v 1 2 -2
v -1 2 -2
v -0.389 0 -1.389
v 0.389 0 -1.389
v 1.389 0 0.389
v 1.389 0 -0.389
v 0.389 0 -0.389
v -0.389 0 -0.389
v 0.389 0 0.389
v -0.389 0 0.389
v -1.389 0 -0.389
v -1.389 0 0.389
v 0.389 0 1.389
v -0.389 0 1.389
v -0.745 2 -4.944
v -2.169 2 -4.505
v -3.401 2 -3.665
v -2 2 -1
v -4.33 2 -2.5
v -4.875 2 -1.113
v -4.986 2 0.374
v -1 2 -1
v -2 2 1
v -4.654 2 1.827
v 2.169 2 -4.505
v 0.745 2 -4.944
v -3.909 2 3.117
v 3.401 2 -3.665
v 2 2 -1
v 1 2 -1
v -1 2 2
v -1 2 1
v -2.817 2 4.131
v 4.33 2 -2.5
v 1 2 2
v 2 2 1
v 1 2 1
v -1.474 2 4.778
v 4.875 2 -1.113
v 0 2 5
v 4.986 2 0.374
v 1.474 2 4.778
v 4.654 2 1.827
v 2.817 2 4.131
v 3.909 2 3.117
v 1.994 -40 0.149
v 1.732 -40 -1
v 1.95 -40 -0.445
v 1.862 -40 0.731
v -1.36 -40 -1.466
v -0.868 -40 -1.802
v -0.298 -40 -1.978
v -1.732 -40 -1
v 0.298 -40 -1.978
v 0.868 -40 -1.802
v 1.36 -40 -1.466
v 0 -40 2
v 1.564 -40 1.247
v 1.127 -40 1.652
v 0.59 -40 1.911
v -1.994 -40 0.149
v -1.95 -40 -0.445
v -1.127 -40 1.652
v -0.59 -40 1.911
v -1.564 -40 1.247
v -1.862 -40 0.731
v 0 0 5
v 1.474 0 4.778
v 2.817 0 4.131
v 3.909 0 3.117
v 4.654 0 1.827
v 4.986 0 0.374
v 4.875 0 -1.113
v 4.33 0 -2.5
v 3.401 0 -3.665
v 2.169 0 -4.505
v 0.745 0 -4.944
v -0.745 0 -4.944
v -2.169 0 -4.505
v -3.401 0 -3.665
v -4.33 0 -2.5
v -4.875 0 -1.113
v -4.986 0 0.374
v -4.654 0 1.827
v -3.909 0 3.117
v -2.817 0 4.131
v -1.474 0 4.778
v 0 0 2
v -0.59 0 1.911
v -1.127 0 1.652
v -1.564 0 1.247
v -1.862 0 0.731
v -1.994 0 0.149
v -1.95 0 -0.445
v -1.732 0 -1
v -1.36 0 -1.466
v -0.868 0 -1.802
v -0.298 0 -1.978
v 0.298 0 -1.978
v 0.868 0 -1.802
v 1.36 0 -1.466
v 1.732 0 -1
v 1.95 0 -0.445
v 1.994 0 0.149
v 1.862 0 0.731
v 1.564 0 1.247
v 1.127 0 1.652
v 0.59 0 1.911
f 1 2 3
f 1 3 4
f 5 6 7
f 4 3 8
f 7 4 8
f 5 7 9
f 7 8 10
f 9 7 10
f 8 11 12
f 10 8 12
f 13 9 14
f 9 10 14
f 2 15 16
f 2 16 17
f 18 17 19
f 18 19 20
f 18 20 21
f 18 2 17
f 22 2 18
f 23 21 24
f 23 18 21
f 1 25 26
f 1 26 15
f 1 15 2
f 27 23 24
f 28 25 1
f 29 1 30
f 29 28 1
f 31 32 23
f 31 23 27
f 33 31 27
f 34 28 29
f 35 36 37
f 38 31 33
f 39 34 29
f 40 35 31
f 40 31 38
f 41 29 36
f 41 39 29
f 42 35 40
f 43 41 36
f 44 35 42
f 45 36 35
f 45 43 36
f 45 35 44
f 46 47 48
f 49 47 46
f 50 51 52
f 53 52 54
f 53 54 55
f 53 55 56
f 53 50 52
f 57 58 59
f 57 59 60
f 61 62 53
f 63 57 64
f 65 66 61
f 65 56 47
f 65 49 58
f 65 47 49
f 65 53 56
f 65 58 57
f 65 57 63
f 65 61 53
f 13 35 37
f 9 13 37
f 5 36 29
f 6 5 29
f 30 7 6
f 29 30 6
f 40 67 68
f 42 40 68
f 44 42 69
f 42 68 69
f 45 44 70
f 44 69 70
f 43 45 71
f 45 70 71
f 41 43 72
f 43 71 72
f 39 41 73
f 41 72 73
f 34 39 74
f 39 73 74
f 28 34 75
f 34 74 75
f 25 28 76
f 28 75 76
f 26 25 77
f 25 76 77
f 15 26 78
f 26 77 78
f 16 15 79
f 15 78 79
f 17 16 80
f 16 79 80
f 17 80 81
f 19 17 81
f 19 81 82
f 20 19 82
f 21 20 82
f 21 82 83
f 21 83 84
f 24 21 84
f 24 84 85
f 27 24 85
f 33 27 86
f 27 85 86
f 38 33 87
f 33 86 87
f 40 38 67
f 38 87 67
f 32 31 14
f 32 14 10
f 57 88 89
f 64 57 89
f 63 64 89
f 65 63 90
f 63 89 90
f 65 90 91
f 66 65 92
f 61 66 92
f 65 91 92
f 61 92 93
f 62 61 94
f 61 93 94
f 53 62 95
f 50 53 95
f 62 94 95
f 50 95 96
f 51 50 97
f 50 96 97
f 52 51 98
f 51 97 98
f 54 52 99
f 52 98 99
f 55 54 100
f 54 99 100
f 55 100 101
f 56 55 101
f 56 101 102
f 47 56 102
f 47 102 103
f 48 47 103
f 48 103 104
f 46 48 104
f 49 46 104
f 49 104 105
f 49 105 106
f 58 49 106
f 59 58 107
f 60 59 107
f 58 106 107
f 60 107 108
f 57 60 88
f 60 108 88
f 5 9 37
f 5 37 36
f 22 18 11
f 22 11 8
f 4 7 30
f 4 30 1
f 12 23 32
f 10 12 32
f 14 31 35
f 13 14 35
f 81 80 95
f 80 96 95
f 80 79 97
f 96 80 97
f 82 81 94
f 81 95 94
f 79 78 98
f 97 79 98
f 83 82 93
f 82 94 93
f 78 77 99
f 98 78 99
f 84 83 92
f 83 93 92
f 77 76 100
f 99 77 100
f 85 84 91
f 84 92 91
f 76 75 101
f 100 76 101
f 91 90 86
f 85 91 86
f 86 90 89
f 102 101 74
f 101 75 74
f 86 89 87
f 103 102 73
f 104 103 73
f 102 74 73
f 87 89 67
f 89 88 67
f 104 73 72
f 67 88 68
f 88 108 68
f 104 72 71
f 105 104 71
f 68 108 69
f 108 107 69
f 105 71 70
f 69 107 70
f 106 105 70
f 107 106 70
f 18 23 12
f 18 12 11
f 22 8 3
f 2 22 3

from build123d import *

# Parameters (mm, degrees)
SKETCH1_R                         = 5
BOSS_EXTRUDE1_DEPTH               = 2
SKETCH2_W                         = 2
SKETCH2_H                         = 4
CUT_EXTRUDE_THIN1_DEPTH           = 2
CUT_EXTRUDE_THIN1_DRAFT           = -17
SKETCH2_W_2                       = 4
SKETCH2_H_2                       = 2
CUT_EXTRUDE_THIN1_PROFILE_2_DEPTH = 2
CUT_EXTRUDE_THIN1_PROFILE_2_DRAFT = -17
SKETCH3_R                         = 2
BOSS_EXTRUDE2_DEPTH               = 40


with BuildPart() as part:
    # Sketch1 → Boss-Extrude1 (new body)
    with BuildSketch(Plane(origin=(0, 0, 0), x_dir=(1, 0, 0), z_dir=(0, 1, 0))):
        with Locations(Location((0, 0, 0), (0, 0, 270))):
            Circle(SKETCH1_R)
    extrude(amount=BOSS_EXTRUDE1_DEPTH)


with BuildPart() as cut_extrude_thin1_tool:
    # Sketch2 → Cut-Extrude-Thin1 (with draft: the straight prism first)
    with BuildSketch(Plane(origin=(0, 2, 0), x_dir=(1, 0, 0), z_dir=(0, 1, 0))):
        Rectangle(SKETCH2_W, SKETCH2_H)
    extrude(amount=-CUT_EXTRUDE_THIN1_DEPTH)
    # Cut-Extrude-Thin1: the draft: its side faces are tilted about the plane it starts from
    cut_extrude_thin1_sides = [cut_extrude_thin1_tool.faces().sort_by_distance(p)[0] for p in [
        (1, 1, 0),
        (0, 1, -2),
        (-1, 1, 0),
        (0, 1, 2),
    ]]
    draft(cut_extrude_thin1_sides, Plane(origin=(0, 2, 0), x_dir=(1, 0, 0), z_dir=(0, 1, 0)), CUT_EXTRUDE_THIN1_DRAFT)


with BuildPart() as part_1:
    add(part.part)

    # Cut-Extrude-Thin1: cut by cut_extrude_thin1_tool
    add(cut_extrude_thin1_tool.part, mode=Mode.SUBTRACT)


with BuildPart() as cut_extrude_thin1_profile_2_tool:
    # Sketch2 → Cut-Extrude-Thin1 profile 2 (with draft: the straight prism first)
    with BuildSketch(Plane(origin=(0, 2, 0), x_dir=(1, 0, 0), z_dir=(0, 1, 0))):
        Rectangle(SKETCH2_W_2, SKETCH2_H_2)
    extrude(amount=-CUT_EXTRUDE_THIN1_PROFILE_2_DEPTH)
    # Cut-Extrude-Thin1 profile 2: the draft: its side faces are tilted about the plane it starts from
    cut_extrude_thin1_profile_2_sides = [cut_extrude_thin1_profile_2_tool.faces().sort_by_distance(p)[0] for p in [
        (0, 1, 1),
        (2, 1, 0),
        (0, 1, -1),
        (-2, 1, 0),
    ]]
    draft(cut_extrude_thin1_profile_2_sides, Plane(origin=(0, 2, 0), x_dir=(1, 0, 0), z_dir=(0, 1, 0)), CUT_EXTRUDE_THIN1_PROFILE_2_DRAFT)


with BuildPart() as part_2:
    add(part_1.part)

    # Cut-Extrude-Thin1 profile 2: cut by cut_extrude_thin1_profile_2_tool
    add(cut_extrude_thin1_profile_2_tool.part, mode=Mode.SUBTRACT)

    # Sketch3 → Boss-Extrude2 (add)
    with BuildSketch(Plane.XZ):
        with Locations(Location((0, 0, 0), (0, 0, 90))):
            Circle(SKETCH3_R)
    extrude(amount=BOSS_EXTRUDE2_DEPTH)


solid = part_2.part
